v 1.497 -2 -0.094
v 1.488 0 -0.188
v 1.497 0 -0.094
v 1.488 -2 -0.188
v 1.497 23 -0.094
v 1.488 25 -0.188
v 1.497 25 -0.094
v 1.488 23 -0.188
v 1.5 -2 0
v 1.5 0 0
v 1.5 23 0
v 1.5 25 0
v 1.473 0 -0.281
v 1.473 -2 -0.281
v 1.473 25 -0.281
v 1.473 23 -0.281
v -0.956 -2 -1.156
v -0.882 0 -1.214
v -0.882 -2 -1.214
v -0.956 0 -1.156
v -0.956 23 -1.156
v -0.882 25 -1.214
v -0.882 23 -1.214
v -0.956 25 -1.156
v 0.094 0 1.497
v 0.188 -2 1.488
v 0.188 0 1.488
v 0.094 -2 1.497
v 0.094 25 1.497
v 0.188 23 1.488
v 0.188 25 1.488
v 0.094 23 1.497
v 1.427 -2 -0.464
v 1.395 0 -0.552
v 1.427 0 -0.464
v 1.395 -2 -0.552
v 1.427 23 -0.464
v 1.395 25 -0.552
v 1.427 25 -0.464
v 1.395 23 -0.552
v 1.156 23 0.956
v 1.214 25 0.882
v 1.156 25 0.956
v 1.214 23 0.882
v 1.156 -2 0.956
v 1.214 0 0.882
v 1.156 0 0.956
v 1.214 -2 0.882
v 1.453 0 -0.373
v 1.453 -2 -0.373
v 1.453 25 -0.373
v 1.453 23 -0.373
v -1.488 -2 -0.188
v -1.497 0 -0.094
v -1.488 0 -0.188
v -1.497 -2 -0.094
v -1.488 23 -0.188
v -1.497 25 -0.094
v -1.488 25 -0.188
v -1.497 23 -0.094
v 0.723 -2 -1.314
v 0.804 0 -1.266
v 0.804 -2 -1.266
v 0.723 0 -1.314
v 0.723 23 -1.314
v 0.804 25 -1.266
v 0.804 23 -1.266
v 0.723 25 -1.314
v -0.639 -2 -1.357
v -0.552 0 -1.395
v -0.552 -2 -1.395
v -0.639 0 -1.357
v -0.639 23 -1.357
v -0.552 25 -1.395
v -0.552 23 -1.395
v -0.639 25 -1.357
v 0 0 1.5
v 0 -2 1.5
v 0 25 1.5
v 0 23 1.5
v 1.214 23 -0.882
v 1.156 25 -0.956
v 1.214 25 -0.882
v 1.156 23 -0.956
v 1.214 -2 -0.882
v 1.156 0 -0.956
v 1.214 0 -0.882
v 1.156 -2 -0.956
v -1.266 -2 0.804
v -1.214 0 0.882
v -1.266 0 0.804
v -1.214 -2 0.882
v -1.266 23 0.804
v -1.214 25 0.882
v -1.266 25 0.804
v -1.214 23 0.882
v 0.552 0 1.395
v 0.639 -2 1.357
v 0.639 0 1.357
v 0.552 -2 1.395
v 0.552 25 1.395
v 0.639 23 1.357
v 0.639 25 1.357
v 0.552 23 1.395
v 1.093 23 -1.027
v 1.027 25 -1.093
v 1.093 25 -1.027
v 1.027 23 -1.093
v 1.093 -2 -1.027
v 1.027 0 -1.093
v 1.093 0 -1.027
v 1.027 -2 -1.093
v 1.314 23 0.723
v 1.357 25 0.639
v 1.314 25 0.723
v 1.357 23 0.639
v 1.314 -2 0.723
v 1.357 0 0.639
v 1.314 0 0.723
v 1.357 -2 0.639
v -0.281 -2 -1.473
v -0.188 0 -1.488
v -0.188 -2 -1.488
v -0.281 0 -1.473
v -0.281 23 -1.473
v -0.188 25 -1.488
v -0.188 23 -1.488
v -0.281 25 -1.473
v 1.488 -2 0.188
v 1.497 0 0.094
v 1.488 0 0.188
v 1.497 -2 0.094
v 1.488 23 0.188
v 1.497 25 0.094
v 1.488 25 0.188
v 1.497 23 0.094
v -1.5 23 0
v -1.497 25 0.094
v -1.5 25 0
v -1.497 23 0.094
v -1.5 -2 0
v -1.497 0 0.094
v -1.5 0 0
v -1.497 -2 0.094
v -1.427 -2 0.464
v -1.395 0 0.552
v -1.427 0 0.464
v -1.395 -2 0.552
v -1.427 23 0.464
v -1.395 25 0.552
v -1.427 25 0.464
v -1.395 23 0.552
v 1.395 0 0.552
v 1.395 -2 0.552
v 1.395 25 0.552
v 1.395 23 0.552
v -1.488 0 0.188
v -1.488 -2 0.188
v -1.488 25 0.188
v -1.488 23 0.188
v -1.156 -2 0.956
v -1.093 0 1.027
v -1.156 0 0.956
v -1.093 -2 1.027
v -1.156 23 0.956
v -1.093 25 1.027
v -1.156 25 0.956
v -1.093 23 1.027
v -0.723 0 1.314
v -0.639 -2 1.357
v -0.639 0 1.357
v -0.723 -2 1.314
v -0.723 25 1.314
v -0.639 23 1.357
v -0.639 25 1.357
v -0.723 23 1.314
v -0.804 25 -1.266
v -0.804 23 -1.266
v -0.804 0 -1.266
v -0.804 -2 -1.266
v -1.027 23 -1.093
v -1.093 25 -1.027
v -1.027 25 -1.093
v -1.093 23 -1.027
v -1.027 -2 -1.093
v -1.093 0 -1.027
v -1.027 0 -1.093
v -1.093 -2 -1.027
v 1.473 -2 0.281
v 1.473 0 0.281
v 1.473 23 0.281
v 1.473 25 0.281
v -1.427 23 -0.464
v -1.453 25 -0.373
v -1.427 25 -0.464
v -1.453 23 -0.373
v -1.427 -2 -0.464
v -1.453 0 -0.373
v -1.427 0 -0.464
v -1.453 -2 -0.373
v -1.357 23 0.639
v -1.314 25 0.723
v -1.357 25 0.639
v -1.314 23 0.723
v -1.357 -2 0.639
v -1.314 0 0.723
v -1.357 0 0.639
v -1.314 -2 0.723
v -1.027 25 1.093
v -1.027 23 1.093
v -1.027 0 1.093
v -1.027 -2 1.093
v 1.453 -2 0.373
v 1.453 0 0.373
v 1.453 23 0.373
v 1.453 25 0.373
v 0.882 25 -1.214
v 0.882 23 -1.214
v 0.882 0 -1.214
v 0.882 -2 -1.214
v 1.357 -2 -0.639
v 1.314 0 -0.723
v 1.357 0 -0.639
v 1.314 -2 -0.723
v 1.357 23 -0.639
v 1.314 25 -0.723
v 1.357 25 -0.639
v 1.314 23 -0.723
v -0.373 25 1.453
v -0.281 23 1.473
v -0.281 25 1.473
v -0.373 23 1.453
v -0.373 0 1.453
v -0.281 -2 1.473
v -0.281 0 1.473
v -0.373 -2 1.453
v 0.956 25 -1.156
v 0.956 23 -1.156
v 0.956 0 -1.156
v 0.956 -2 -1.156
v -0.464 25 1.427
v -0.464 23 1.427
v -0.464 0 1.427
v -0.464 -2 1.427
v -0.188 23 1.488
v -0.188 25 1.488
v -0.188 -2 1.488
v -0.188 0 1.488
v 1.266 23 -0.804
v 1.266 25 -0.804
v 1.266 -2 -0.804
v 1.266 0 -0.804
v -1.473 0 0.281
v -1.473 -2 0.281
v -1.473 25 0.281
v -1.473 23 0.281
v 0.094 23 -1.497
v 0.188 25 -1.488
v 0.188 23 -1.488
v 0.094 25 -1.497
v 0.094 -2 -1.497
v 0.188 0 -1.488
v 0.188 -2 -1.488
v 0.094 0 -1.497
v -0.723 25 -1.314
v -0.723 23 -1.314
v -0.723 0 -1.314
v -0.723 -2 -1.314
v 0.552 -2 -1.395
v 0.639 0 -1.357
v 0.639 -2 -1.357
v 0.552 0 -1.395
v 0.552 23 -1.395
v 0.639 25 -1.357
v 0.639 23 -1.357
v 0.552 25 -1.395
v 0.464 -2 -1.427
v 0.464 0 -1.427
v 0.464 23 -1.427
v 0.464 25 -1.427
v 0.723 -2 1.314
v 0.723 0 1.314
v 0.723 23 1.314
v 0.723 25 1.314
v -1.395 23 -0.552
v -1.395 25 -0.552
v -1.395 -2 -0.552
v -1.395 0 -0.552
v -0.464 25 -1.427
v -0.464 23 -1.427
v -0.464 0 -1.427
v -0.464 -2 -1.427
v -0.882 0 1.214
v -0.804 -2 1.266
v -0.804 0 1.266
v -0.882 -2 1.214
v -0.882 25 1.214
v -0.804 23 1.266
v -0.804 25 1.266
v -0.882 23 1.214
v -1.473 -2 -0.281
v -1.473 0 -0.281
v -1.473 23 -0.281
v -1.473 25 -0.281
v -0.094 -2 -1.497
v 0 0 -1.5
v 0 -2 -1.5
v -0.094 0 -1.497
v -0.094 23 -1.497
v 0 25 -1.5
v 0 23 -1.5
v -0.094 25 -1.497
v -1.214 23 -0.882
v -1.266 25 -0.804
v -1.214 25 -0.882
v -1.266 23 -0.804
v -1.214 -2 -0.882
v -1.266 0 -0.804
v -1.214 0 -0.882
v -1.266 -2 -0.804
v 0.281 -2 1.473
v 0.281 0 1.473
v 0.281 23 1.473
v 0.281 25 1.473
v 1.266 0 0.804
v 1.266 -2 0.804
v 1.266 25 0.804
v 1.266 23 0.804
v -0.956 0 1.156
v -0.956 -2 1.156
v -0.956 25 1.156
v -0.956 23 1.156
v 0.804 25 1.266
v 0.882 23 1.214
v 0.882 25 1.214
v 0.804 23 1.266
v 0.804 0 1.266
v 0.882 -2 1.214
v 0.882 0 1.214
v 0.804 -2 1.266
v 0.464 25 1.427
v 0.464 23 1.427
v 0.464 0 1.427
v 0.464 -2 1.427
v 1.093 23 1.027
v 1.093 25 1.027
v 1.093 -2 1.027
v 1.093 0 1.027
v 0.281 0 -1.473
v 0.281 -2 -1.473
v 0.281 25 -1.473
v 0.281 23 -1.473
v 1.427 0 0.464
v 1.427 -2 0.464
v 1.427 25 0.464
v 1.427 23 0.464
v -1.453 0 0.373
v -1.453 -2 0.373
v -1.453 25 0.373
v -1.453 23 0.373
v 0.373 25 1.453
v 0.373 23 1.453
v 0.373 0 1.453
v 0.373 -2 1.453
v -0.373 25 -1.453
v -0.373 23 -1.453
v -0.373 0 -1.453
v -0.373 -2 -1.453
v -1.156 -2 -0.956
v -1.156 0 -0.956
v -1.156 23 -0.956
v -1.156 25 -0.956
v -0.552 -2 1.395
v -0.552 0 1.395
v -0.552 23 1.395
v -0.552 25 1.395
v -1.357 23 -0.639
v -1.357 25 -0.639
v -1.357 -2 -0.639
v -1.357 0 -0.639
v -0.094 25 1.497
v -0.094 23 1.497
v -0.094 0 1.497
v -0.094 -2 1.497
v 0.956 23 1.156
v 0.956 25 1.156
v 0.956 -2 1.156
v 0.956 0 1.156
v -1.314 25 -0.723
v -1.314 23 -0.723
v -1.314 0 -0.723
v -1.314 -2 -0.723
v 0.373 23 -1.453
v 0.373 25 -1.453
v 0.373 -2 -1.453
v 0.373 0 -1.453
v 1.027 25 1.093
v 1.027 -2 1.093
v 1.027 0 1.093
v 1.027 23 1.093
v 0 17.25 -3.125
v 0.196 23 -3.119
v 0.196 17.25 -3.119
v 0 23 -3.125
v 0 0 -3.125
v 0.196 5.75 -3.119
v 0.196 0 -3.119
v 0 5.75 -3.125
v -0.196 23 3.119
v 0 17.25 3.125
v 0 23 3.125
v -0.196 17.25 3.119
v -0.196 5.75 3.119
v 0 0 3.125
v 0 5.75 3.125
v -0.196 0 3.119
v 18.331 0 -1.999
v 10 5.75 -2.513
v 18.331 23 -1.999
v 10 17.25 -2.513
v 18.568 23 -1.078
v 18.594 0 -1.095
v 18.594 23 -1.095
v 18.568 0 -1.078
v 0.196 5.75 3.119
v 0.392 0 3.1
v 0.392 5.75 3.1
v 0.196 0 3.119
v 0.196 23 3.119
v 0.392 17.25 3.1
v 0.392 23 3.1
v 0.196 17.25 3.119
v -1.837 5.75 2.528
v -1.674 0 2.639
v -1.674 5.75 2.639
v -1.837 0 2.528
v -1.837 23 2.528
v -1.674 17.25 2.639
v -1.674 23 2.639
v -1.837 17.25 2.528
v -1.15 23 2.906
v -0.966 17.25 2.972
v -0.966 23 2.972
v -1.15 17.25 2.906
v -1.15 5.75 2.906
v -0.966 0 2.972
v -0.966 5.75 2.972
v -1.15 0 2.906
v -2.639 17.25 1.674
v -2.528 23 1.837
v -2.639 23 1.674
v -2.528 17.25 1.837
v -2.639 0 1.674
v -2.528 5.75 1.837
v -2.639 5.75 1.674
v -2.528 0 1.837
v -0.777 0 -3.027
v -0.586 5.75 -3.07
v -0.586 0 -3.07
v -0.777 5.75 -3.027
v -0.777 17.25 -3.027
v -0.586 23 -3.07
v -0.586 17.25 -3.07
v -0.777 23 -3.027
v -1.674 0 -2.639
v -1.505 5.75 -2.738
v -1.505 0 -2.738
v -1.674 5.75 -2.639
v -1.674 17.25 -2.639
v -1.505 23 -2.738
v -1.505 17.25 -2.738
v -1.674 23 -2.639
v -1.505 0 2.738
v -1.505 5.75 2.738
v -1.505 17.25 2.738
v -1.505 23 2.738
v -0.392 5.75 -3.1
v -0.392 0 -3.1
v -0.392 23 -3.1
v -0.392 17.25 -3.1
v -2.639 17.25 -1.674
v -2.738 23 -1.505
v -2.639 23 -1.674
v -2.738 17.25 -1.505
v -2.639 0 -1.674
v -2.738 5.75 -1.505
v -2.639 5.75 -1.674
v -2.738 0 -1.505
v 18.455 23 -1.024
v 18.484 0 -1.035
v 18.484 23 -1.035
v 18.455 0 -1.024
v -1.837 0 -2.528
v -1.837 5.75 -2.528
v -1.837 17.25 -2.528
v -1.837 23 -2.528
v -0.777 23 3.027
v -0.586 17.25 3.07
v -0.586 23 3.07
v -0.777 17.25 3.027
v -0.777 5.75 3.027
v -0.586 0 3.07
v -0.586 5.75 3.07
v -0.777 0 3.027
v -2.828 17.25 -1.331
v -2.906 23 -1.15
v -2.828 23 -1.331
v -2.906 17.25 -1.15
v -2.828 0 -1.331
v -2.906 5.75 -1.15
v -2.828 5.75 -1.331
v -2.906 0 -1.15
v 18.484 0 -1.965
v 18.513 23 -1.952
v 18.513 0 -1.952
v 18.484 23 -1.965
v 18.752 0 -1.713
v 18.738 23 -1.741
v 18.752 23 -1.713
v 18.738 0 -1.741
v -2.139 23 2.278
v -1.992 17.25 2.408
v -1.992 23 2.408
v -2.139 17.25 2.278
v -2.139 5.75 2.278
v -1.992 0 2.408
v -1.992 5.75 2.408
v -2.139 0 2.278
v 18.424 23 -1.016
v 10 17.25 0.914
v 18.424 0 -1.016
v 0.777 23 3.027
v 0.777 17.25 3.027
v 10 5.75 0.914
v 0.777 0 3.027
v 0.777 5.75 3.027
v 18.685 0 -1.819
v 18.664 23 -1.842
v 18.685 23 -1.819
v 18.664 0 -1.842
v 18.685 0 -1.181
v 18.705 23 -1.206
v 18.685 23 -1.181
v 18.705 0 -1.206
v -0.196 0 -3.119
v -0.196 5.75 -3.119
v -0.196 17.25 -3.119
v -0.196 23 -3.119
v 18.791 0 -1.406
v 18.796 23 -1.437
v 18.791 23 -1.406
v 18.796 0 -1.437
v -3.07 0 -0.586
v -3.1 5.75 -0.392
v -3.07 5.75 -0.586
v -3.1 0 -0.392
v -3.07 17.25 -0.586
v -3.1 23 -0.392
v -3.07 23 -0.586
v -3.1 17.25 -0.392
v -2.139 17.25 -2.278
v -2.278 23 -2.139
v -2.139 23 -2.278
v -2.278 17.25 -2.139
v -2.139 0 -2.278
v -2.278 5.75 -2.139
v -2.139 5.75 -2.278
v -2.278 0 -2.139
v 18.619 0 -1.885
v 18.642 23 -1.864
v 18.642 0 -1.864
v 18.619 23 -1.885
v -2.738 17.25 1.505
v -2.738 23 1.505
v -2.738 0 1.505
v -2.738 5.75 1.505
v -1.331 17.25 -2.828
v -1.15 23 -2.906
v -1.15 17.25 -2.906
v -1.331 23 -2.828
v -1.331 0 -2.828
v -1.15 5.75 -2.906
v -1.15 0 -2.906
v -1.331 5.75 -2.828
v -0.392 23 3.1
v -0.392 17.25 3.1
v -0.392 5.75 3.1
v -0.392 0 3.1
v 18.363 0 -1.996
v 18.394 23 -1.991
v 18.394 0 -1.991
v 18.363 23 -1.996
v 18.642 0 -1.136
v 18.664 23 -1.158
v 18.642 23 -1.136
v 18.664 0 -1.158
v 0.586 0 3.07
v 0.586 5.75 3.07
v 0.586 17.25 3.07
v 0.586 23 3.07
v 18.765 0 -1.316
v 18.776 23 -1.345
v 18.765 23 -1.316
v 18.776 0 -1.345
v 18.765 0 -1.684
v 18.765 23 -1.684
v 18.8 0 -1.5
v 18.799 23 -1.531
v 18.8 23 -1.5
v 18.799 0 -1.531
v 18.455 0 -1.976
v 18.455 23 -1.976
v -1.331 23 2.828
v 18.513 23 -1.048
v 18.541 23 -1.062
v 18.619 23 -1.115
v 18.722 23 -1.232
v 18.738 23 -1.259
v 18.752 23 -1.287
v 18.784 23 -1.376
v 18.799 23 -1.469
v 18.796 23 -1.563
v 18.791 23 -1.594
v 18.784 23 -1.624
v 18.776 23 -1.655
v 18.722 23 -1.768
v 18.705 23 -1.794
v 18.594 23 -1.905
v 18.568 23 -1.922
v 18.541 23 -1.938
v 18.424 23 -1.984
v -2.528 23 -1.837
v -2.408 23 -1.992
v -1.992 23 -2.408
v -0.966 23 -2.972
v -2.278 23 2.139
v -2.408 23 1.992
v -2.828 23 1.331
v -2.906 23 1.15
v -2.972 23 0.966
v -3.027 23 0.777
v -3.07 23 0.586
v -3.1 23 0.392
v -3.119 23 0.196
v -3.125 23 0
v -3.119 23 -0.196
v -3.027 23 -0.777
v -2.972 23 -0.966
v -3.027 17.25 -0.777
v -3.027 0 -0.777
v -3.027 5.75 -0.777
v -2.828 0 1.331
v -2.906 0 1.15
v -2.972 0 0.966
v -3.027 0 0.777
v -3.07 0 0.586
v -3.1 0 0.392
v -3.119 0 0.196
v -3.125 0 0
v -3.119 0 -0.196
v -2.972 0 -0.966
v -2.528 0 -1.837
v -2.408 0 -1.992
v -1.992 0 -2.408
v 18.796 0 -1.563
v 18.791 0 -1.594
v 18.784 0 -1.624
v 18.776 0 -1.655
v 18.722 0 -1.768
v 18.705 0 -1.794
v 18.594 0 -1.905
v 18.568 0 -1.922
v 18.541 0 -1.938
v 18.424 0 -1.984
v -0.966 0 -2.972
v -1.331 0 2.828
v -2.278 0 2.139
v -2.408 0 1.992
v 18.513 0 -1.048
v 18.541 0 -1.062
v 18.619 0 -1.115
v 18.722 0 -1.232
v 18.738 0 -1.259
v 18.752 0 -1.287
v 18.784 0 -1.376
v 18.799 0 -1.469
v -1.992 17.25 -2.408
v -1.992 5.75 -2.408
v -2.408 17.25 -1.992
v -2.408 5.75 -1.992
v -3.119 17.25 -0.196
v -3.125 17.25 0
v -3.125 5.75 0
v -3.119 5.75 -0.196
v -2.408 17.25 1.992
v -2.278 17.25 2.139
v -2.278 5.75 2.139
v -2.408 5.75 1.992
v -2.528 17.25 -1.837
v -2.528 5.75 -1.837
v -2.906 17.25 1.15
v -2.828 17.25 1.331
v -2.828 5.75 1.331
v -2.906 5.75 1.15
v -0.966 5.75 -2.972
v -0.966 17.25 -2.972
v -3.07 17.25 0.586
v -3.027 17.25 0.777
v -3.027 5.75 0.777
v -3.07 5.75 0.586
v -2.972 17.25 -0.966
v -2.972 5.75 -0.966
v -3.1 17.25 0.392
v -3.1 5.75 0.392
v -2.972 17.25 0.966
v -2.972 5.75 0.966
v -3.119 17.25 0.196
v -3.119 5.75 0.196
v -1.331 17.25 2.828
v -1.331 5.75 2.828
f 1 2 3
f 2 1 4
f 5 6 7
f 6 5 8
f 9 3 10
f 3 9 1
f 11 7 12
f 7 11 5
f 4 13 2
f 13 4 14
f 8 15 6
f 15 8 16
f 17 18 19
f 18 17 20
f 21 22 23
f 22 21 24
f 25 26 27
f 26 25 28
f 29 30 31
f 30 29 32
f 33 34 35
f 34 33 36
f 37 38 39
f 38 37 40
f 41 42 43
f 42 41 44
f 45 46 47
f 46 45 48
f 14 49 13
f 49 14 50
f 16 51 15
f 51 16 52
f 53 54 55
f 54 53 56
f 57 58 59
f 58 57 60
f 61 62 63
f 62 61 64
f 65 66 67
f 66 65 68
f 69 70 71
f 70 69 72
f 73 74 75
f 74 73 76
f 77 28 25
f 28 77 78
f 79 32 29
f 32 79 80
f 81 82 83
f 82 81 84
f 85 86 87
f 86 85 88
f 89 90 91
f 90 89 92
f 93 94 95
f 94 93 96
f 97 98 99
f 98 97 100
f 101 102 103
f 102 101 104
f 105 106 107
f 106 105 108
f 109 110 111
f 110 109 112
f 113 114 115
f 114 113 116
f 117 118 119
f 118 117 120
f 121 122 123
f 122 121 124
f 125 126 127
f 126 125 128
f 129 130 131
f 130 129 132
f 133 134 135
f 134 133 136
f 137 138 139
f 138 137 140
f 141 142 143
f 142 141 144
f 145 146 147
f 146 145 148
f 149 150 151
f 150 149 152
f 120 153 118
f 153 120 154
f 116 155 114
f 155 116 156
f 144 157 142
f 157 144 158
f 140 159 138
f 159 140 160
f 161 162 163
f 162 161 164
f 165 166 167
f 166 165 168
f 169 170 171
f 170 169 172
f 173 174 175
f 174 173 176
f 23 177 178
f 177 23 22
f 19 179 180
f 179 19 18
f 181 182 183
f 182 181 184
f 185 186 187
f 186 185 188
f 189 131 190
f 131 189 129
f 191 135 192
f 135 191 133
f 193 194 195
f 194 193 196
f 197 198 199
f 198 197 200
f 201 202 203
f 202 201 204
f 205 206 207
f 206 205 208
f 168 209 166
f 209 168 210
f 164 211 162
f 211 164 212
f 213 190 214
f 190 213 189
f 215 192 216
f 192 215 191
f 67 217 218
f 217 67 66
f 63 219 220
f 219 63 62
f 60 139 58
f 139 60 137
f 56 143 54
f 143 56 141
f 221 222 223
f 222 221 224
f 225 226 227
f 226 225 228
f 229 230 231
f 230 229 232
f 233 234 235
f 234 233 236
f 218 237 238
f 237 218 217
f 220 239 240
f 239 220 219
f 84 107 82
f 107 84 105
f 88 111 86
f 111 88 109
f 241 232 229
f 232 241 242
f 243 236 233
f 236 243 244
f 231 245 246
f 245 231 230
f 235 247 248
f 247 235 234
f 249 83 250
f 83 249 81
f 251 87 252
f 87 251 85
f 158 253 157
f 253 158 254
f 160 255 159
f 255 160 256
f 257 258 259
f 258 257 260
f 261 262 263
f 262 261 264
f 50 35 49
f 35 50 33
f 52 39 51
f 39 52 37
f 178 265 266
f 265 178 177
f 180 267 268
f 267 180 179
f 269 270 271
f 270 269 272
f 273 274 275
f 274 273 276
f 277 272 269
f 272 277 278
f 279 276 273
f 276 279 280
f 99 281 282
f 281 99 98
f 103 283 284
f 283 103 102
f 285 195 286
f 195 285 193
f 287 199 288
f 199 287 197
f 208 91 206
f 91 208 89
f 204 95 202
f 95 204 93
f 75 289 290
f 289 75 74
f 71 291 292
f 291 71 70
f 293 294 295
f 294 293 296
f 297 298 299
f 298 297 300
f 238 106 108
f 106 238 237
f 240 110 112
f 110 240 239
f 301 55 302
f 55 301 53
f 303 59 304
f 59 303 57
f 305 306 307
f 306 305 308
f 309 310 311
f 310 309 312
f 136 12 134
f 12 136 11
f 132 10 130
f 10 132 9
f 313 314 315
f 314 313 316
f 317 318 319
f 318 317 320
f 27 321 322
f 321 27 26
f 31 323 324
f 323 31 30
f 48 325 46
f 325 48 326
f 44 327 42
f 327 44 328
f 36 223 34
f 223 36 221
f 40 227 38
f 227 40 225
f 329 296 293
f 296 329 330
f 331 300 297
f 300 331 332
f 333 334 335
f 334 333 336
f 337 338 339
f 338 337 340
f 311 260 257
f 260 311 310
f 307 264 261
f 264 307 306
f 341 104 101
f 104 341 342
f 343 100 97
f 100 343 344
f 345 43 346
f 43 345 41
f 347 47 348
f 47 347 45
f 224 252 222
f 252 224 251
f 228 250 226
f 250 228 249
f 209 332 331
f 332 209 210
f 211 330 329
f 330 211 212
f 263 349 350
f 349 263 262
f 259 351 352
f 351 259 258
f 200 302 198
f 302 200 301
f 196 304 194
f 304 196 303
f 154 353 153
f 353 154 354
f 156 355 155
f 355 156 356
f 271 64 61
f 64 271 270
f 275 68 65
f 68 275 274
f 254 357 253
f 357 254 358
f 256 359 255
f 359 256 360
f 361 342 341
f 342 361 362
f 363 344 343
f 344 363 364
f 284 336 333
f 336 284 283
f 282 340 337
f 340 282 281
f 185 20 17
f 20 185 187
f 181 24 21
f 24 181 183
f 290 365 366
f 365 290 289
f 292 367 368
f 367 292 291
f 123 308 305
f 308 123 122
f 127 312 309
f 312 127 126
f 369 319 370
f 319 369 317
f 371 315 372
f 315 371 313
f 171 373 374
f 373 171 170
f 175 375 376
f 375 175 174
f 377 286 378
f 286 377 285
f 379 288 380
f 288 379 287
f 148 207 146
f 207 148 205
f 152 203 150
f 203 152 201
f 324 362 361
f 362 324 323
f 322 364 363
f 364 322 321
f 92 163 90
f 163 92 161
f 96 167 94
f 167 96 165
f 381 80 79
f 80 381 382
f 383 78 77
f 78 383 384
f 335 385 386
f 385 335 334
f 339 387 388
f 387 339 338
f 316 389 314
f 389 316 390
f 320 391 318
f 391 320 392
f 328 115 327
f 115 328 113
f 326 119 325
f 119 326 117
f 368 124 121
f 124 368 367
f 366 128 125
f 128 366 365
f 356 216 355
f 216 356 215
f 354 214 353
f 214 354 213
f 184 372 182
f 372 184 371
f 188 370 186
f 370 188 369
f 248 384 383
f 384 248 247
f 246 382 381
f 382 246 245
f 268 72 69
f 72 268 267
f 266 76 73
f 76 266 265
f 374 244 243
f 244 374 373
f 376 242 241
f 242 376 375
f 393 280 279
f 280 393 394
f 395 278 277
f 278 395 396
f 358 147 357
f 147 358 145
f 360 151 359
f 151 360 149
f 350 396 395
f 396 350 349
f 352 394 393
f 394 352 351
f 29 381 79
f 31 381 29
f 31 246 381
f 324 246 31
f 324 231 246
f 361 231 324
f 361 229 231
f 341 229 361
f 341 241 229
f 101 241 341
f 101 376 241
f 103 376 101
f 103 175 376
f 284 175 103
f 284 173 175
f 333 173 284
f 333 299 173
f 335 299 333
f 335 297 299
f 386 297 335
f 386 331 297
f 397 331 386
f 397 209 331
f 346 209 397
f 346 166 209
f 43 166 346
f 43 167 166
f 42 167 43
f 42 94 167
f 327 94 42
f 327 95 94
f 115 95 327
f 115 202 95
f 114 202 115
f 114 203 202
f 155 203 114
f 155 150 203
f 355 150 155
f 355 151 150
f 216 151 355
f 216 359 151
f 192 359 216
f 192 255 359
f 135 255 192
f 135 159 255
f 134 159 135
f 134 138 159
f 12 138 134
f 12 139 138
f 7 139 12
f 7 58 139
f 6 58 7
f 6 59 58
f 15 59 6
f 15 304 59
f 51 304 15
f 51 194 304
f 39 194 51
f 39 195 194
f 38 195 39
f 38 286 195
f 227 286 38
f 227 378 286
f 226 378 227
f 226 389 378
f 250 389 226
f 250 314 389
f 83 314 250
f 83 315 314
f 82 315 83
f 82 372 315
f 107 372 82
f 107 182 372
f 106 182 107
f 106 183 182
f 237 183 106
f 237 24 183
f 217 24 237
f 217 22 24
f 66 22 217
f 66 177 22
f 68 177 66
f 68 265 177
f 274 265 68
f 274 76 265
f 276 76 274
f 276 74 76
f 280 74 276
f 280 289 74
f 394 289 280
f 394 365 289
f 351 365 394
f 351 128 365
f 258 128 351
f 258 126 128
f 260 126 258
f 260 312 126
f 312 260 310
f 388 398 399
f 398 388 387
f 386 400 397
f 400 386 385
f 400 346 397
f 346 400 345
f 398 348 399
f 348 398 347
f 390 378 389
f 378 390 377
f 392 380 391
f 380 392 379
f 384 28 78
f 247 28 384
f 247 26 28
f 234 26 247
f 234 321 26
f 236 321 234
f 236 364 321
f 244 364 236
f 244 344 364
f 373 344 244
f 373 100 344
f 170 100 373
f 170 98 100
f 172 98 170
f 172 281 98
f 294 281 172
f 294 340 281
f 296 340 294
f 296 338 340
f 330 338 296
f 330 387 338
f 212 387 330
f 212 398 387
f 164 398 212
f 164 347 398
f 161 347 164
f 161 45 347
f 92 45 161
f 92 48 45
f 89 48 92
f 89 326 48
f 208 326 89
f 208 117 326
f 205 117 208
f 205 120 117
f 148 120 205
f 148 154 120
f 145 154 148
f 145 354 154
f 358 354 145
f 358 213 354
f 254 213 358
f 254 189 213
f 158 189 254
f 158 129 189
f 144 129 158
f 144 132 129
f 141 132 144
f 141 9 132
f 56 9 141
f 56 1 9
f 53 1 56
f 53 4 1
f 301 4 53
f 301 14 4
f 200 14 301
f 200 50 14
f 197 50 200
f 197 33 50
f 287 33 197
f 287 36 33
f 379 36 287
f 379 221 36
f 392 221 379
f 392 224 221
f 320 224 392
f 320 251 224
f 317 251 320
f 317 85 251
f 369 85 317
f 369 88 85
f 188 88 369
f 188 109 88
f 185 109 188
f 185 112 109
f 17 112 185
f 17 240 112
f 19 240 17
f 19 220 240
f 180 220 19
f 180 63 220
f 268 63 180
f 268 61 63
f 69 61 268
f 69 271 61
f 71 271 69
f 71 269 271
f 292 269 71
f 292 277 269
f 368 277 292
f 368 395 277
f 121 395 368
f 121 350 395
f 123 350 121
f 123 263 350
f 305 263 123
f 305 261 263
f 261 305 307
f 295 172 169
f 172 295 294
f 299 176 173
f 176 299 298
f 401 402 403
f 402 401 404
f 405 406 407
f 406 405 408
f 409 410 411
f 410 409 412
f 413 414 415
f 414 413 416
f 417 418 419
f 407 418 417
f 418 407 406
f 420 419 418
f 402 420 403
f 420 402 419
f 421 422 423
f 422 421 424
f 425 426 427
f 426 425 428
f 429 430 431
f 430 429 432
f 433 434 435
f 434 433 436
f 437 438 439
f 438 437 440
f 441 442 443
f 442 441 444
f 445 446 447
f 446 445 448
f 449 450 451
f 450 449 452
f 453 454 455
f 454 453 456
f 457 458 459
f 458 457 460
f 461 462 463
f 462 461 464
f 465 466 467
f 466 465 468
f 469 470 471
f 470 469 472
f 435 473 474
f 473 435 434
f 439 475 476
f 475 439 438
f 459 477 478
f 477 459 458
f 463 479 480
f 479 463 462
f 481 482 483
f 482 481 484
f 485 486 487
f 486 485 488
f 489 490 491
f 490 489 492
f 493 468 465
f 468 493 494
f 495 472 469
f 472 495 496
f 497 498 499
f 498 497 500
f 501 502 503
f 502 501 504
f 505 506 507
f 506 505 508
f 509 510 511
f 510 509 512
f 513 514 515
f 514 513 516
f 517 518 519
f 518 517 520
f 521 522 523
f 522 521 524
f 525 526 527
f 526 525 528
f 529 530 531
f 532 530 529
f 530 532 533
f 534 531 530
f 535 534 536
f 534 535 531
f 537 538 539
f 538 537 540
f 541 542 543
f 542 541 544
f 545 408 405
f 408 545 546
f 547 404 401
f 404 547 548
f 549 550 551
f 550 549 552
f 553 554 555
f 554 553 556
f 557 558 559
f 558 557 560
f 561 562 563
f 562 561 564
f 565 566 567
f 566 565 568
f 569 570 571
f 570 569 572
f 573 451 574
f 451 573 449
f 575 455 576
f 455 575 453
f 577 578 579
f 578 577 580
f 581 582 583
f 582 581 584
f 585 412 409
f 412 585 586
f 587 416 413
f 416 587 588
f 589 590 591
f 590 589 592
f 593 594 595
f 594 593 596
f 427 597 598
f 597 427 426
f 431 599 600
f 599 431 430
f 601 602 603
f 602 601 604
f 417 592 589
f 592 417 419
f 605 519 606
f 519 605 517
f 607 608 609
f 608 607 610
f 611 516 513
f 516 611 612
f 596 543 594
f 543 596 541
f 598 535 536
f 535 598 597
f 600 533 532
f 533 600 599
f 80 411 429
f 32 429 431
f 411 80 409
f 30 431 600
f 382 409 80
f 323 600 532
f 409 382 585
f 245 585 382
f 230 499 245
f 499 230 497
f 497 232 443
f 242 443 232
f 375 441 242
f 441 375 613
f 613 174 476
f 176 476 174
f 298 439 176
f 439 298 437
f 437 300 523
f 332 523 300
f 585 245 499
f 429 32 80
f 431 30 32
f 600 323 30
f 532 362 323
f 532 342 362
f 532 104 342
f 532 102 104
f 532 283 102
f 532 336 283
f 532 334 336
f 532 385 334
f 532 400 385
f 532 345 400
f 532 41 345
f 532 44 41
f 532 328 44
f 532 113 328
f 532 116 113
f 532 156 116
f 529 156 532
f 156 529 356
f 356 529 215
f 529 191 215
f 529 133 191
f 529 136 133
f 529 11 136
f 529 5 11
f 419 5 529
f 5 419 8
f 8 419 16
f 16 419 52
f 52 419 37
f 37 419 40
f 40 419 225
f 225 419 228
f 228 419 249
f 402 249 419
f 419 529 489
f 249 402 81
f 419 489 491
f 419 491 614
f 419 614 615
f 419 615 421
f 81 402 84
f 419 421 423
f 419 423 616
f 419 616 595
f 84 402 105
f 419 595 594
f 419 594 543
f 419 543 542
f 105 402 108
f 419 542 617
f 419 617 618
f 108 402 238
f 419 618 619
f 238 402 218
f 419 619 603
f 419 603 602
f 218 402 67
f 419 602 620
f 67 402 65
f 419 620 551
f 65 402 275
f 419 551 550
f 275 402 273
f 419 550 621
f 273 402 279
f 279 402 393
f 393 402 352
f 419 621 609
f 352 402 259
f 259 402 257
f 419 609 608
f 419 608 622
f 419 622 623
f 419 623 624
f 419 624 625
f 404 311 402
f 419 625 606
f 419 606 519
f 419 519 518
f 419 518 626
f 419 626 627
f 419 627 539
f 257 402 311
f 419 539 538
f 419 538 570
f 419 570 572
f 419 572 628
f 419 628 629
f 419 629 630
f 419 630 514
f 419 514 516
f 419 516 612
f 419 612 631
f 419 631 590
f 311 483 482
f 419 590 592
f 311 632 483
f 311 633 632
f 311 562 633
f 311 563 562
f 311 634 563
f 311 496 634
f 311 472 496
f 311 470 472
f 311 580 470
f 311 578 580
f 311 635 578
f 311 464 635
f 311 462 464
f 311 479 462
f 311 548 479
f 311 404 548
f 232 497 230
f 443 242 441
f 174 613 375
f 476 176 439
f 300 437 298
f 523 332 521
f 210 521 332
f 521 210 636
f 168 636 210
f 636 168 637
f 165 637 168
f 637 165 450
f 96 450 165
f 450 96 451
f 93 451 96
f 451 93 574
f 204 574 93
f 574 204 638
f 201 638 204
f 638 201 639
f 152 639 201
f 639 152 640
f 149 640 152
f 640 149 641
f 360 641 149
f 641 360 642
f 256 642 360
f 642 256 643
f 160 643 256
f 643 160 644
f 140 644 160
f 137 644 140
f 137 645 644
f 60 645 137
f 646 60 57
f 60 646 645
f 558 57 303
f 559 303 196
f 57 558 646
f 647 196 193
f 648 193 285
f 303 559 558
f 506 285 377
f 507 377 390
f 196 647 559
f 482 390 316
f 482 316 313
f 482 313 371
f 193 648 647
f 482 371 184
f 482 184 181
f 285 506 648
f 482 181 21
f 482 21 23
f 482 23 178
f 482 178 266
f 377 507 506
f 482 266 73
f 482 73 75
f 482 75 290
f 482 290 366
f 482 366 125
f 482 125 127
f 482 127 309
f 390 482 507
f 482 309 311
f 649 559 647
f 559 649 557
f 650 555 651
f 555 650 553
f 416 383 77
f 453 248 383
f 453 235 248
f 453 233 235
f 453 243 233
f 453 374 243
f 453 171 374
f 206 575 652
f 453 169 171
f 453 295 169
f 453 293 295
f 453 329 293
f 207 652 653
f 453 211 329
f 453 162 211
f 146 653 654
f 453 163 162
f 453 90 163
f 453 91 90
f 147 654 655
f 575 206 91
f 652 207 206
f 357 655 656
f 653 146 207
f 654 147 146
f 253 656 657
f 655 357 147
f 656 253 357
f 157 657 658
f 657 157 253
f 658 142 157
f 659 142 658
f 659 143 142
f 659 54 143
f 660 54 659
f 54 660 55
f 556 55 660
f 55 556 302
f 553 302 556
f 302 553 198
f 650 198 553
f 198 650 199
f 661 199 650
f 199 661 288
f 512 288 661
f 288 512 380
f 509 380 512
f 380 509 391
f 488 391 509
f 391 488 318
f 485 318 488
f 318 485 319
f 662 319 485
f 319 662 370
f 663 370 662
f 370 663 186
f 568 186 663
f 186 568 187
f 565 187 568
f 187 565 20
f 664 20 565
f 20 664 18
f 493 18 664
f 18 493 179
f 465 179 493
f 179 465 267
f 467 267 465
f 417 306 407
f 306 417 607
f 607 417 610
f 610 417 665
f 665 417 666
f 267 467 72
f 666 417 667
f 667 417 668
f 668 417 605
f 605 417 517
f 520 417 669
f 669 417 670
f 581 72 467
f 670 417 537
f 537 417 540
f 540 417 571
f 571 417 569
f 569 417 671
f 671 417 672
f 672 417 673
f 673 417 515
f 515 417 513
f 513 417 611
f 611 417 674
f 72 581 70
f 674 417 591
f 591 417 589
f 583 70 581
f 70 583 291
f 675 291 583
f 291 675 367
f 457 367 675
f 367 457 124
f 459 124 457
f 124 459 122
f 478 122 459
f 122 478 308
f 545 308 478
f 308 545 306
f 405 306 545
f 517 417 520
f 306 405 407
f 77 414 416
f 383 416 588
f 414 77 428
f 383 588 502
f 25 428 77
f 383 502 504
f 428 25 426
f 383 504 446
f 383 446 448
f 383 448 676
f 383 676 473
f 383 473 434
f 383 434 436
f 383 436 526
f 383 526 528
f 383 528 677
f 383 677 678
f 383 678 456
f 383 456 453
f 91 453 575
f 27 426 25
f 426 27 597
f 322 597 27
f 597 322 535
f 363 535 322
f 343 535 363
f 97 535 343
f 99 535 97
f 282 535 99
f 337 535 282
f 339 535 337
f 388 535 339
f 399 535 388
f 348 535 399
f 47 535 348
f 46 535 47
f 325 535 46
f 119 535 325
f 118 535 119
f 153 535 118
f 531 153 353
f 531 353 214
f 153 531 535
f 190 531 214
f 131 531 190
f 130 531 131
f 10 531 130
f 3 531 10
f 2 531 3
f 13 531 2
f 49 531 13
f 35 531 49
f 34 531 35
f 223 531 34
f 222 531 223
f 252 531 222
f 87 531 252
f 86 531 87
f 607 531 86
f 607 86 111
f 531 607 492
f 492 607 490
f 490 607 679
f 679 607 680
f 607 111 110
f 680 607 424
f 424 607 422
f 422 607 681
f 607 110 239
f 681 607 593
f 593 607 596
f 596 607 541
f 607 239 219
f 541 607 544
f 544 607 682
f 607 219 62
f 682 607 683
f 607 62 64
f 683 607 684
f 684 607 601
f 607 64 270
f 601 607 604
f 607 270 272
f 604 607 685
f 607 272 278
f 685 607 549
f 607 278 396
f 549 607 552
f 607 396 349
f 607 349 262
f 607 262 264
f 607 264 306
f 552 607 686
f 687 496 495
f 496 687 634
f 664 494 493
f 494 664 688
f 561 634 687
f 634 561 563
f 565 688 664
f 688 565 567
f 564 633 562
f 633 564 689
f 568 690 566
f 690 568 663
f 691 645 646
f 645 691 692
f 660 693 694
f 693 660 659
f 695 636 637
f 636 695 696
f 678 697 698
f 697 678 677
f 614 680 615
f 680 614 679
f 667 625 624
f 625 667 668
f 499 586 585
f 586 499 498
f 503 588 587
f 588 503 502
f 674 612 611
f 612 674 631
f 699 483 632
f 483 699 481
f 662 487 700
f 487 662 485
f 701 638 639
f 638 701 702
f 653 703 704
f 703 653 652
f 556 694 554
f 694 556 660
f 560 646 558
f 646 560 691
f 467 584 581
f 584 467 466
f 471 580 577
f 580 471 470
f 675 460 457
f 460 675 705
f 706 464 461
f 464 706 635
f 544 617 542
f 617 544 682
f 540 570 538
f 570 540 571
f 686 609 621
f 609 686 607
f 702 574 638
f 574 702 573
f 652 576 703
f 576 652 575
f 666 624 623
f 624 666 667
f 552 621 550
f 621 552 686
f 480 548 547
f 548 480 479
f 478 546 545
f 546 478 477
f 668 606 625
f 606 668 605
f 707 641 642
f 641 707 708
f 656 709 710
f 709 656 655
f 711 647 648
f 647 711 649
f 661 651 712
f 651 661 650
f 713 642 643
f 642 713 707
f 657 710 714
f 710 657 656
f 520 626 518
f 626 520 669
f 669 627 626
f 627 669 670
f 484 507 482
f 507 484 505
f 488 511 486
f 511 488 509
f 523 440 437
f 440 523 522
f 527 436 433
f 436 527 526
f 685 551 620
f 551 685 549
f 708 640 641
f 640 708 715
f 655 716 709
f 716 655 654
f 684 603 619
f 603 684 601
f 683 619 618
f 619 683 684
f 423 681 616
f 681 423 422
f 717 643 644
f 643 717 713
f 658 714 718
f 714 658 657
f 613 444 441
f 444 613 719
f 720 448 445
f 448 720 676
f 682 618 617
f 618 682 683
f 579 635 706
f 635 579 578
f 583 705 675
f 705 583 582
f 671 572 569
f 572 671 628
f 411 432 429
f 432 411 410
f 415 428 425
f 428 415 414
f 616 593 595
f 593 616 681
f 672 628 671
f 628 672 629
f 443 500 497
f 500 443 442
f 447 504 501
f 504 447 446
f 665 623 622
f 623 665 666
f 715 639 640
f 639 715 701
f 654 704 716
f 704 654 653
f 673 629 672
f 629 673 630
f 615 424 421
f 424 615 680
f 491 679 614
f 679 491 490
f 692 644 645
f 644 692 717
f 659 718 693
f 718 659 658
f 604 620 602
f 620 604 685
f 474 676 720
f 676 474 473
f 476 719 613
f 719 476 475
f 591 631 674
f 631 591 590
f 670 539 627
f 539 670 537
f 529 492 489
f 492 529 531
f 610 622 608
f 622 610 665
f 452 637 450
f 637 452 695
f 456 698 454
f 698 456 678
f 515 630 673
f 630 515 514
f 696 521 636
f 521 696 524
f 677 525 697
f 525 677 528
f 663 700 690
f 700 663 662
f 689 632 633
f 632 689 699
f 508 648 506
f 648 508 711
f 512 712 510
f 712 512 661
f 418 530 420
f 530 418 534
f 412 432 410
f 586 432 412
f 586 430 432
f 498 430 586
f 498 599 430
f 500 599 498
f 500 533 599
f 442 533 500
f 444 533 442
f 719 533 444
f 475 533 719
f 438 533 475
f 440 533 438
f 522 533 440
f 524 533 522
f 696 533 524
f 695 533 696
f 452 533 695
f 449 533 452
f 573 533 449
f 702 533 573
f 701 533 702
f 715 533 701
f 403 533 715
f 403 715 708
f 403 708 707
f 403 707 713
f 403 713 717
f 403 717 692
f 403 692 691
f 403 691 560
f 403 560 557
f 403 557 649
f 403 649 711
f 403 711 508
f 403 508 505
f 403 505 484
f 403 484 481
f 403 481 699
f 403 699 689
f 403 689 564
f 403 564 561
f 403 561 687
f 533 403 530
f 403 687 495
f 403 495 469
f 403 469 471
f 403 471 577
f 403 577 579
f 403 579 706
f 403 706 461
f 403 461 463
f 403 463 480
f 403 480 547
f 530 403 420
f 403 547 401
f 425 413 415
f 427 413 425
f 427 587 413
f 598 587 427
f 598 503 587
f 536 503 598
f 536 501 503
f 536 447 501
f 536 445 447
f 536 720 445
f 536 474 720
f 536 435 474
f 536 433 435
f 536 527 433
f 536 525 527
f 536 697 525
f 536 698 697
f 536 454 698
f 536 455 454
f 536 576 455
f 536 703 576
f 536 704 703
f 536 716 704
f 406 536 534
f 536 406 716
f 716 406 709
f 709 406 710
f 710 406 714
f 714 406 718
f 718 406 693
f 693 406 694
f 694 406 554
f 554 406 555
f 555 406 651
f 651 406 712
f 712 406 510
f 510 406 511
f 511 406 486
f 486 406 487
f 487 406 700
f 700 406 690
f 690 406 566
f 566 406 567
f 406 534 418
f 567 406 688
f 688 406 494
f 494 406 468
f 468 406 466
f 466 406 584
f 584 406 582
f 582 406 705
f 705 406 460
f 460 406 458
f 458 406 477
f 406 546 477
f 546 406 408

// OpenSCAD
ht = 23;
$fn=100;
rotate([-90,0,0])
difference(){
    
    union(){
        extra = 2;
        translate([0,0,-extra])
        cylinder(h=ht+2*extra, d=3);

        hull(){
        cylinder(h=ht, d=6.25);
        translate([18.3,1.5,0])
        cylinder(d=1,h=ht);
        }
    }
    translate([-5,-5,ht/4])
    cube([15,15,ht/2]);
}
